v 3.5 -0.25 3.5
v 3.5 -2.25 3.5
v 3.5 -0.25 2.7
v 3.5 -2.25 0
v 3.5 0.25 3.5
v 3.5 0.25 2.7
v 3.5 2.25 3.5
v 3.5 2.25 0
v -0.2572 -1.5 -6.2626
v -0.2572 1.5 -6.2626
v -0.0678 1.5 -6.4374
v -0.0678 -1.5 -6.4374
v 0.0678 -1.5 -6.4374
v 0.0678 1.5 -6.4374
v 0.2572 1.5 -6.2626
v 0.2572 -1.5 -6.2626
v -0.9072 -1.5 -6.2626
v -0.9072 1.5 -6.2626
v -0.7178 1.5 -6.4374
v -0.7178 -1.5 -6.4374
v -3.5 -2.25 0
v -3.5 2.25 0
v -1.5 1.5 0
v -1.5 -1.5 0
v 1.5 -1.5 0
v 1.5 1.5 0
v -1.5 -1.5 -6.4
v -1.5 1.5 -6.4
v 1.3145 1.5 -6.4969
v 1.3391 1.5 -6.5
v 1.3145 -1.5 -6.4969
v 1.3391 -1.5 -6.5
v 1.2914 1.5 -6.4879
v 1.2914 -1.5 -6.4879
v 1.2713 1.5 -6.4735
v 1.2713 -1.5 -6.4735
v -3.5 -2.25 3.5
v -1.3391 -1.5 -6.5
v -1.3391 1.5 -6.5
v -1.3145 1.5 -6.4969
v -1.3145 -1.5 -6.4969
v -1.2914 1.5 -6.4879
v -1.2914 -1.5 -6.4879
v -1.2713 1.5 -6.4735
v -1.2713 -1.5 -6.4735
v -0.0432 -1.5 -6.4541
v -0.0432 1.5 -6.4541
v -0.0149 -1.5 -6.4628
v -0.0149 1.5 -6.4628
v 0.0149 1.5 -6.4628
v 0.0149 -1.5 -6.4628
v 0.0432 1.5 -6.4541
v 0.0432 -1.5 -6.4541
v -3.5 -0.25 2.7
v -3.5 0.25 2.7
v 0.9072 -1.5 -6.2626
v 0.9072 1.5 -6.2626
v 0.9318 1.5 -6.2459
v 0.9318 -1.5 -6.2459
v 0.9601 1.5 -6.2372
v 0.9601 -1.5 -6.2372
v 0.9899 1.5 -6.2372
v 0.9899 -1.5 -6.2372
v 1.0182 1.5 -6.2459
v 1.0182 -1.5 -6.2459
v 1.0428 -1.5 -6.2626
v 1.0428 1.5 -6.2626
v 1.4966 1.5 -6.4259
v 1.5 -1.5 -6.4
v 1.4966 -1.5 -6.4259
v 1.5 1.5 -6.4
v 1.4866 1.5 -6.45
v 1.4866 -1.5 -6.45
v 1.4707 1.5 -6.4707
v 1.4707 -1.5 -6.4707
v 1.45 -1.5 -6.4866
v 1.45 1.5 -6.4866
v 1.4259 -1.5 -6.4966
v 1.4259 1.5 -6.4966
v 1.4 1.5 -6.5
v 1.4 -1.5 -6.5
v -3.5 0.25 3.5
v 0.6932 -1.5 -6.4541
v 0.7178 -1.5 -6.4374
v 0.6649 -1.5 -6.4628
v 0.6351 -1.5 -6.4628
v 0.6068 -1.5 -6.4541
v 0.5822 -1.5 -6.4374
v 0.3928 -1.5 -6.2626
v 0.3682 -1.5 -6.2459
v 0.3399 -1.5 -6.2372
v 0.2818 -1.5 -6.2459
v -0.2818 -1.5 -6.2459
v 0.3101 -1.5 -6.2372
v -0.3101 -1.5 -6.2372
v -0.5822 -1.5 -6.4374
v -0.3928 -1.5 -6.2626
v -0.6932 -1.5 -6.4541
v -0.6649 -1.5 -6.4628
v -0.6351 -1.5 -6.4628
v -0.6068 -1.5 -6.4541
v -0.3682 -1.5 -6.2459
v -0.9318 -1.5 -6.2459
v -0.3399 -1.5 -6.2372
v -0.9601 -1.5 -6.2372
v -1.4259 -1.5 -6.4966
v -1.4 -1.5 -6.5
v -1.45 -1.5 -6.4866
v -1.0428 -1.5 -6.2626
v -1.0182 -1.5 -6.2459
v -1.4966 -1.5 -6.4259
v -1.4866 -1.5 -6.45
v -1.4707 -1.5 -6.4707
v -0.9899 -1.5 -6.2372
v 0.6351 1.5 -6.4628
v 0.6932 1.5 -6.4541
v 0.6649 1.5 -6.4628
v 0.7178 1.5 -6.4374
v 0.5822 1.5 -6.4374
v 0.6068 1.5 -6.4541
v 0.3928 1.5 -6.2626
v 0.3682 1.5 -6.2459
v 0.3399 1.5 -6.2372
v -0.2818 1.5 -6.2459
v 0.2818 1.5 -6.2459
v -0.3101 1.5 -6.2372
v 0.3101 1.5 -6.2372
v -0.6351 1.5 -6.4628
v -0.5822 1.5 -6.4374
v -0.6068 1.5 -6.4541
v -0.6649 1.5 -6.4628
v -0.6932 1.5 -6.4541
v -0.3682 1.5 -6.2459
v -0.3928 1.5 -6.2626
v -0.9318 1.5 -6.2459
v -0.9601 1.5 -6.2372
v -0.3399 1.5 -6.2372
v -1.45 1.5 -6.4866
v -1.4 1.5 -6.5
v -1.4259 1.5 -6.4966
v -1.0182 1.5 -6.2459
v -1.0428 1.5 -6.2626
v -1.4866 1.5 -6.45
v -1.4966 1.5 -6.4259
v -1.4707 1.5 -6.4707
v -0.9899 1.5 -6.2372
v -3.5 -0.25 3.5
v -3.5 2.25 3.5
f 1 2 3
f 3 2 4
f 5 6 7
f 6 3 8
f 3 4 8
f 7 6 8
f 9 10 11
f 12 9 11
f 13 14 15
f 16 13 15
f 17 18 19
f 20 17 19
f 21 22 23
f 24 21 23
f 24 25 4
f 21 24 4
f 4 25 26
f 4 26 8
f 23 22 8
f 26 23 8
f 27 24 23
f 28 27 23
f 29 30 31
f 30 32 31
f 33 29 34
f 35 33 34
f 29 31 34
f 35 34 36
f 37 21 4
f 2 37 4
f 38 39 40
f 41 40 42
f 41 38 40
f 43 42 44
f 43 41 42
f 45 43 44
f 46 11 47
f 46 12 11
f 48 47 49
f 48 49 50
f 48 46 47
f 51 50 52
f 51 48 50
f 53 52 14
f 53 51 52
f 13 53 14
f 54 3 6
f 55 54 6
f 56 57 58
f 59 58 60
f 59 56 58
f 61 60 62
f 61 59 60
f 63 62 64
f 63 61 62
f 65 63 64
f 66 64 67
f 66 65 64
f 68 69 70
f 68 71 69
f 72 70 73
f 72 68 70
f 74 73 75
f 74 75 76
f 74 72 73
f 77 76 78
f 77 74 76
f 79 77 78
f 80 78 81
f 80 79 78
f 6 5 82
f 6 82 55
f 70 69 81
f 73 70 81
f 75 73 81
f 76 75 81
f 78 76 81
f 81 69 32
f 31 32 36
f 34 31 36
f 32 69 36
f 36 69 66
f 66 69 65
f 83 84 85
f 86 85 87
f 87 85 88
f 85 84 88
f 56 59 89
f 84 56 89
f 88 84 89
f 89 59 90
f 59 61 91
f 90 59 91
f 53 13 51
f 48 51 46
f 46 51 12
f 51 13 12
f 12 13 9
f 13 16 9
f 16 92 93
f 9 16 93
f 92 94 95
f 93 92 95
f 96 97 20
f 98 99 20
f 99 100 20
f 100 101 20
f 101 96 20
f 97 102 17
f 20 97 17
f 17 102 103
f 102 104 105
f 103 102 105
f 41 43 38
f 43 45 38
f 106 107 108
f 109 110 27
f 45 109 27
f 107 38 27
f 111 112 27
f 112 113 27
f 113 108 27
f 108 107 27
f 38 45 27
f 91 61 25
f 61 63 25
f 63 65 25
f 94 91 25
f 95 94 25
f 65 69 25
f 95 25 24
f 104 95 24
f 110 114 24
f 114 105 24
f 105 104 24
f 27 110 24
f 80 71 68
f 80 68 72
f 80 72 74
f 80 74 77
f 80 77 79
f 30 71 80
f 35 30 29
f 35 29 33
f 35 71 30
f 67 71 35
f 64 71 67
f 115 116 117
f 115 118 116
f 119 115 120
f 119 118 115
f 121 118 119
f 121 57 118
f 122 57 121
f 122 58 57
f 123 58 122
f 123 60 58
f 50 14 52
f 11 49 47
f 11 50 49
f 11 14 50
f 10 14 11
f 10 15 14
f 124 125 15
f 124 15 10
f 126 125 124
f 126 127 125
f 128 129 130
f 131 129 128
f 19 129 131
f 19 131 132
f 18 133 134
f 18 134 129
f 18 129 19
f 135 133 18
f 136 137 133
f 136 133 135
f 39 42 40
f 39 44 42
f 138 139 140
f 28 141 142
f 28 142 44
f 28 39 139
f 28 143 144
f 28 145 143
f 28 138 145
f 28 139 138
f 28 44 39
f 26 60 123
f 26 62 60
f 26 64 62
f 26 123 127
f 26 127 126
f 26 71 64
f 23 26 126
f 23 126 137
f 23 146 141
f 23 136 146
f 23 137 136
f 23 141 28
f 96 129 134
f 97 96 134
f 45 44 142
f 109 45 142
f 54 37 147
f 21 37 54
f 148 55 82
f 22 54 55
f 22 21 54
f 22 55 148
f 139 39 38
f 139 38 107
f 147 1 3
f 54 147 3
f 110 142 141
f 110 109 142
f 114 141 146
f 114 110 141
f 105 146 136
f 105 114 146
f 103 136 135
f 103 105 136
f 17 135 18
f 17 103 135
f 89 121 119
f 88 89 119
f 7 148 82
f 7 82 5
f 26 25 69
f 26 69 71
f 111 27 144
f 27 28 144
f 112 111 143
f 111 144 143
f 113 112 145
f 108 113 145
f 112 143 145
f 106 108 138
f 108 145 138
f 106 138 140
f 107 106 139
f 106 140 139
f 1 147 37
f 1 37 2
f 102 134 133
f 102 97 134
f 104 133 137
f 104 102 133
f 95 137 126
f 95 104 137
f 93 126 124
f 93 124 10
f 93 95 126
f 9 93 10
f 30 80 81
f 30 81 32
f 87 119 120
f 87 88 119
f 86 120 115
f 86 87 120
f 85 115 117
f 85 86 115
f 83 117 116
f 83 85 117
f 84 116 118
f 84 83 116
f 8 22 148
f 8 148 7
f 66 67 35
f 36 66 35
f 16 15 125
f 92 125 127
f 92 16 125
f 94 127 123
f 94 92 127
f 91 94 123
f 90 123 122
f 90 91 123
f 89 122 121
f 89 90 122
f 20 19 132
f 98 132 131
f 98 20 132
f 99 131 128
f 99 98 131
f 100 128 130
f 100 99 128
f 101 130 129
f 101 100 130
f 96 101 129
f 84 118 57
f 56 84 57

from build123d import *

# Parameters (mm, degrees)
SKETCH_1_W          = 7
SKETCH_1_H          = 4.5
EXTRUDE_1_DEPTH     = 3.5
SKETCH_3_W          = 3
SKETCH_3_H          = 3
EXTRUDE_2_DEPTH     = 6.5
SKETCH_4_W          = 1.6
SKETCH_4_H          = 0.5
CUT_EXTRUDE_1_DEPTH = 10.813893213
CUT_EXTRUDE_2_DEPTH = 6.5
FILLET_1_R          = 0.1


with BuildPart() as part:
    # 草图1 → 凸台-拉伸1 (new body)
    with BuildSketch(Plane.XY):
        Rectangle(SKETCH_1_W, SKETCH_1_H)
    extrude(amount=EXTRUDE_1_DEPTH)

    # 草图3 → 凸台-拉伸2 (add)
    with BuildSketch(Plane(origin=(0, 0, 0), x_dir=(-1, 0, 0), z_dir=(0, 0, -1))):
        Rectangle(SKETCH_3_W, SKETCH_3_H)
    extrude(amount=EXTRUDE_2_DEPTH)

    # 草图4 → 切除-拉伸1 (cut, through all)
    with BuildSketch(Plane(origin=(3.5, 0, 0), x_dir=(0, 0, -1), z_dir=(1, 0, 0))):
        with Locations((-3.5, 0)):
            Rectangle(SKETCH_4_W, SKETCH_4_H)
    extrude(amount=-CUT_EXTRUDE_1_DEPTH, mode=Mode.SUBTRACT)

    # 草图5 → 切除-拉伸2 (cut)
    with BuildSketch(Plane(origin=(0, 1.5, 0), x_dir=(1, 0, 0), z_dir=(0, 1, 0))):
        Polygon((-0.65, 6.5), (-1.3, 6.5), (-0.975, 6.2), align=None)
        Polygon((0, 6.5), (-0.65, 6.5), (-0.325, 6.2), align=None)
        Polygon((0.65, 6.5), (0, 6.5), (0.325, 6.2), align=None)
        Polygon((1.3, 6.5), (0.65, 6.5), (0.975, 6.2), align=None)
    extrude(amount=-CUT_EXTRUDE_2_DEPTH, mode=Mode.SUBTRACT)

    # 圆角1
    fillet_1_edges = [part.edges().sort_by_distance(p)[0] for p in [
        (1.5, 0, -6.5),
        (-1.5, 0, -6.5),
        (0.65, 0, -6.5),
        (0, 0, -6.5),
        (-0.65, 0, -6.5),
        (-1.3, 0, -6.5),
        (-0.975, 0, -6.2),
        (0.325, 0, -6.2),
        (-0.325, 0, -6.2),
        (1.3, 0, -6.5),
        (0.975, 0, -6.2),
    ]]
    fillet(fillet_1_edges, radius=FILLET_1_R)


solid = part.part
